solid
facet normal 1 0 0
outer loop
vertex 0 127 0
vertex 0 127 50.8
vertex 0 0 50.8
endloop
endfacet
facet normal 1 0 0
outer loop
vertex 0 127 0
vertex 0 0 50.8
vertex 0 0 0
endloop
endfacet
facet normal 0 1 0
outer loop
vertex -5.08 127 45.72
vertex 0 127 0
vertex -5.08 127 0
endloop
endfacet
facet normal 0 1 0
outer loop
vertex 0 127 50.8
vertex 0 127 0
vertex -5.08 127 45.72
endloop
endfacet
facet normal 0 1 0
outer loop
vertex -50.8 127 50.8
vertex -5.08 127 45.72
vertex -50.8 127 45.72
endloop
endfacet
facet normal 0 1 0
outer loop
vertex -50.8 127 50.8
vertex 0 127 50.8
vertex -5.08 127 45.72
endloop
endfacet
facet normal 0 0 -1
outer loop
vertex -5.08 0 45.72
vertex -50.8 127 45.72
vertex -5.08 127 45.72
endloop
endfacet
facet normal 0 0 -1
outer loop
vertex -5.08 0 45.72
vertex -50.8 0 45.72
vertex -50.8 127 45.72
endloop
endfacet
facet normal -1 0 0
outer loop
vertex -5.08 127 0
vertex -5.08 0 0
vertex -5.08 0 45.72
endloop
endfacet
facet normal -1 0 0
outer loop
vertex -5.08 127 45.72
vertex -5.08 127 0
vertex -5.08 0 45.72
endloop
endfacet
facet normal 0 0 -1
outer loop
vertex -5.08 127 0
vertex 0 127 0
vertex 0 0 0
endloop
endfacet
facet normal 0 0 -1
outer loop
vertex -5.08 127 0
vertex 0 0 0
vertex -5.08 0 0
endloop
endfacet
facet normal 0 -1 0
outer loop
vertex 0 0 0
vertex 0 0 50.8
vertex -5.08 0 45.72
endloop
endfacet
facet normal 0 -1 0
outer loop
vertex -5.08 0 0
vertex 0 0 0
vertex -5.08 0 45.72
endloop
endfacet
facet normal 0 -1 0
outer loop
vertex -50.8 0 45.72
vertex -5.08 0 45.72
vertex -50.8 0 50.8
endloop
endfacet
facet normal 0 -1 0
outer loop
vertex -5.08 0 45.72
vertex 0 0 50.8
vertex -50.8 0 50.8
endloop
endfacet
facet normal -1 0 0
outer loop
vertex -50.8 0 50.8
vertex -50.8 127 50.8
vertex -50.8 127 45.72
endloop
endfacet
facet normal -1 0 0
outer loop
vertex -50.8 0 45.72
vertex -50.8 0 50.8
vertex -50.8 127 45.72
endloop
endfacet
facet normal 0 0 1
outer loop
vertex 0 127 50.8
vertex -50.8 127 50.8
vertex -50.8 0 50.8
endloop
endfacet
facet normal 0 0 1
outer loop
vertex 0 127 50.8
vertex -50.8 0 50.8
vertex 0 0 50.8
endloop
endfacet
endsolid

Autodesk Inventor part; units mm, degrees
ref_plane "YZ Plane" through (0, 0, 0) normal (1, 0, 0) x (0, 1, 0)
ref_plane "XZ Plane" through (0, 0, 0) normal (0, 1, 0) x (-1, 0, 0)
ref_plane "XY Plane" through (0, 0, 0) normal (0, 0, 1) x (1, 0, 0)
sketch "Sketch1" plane through (0, 0, 0) normal (0, 1, 0) x (-1, 0, 0)
  line L0 (0, 0) -> (5.08, 0)
  line L1 (5.08, 0) -> (5.08, 50.8)
  line L2 (5.08, 50.8) -> (0, 50.8)
  line L3 (0, 50.8) -> (0, 0)
  line L4 (5.08, 50.8) -> (50.8, 50.8)
  line L5 (50.8, 50.8) -> (50.8, 45.72)
  line L6 (50.8, 45.72) -> (5.08, 45.72)
  line L7 (5.08, 45.72) -> (5.08, 50.8)
  point P0 (5.08, 45.72)
  dimension "d5" = 50.8
  dimension "d6" = 5.08
  dimension "d7" = 5.08
  dimension "d8" = 50.8
extrude "Extrusion1" add sketch "Sketch1" along normal blind 127
properties part number "Flower Box Stack Half"
